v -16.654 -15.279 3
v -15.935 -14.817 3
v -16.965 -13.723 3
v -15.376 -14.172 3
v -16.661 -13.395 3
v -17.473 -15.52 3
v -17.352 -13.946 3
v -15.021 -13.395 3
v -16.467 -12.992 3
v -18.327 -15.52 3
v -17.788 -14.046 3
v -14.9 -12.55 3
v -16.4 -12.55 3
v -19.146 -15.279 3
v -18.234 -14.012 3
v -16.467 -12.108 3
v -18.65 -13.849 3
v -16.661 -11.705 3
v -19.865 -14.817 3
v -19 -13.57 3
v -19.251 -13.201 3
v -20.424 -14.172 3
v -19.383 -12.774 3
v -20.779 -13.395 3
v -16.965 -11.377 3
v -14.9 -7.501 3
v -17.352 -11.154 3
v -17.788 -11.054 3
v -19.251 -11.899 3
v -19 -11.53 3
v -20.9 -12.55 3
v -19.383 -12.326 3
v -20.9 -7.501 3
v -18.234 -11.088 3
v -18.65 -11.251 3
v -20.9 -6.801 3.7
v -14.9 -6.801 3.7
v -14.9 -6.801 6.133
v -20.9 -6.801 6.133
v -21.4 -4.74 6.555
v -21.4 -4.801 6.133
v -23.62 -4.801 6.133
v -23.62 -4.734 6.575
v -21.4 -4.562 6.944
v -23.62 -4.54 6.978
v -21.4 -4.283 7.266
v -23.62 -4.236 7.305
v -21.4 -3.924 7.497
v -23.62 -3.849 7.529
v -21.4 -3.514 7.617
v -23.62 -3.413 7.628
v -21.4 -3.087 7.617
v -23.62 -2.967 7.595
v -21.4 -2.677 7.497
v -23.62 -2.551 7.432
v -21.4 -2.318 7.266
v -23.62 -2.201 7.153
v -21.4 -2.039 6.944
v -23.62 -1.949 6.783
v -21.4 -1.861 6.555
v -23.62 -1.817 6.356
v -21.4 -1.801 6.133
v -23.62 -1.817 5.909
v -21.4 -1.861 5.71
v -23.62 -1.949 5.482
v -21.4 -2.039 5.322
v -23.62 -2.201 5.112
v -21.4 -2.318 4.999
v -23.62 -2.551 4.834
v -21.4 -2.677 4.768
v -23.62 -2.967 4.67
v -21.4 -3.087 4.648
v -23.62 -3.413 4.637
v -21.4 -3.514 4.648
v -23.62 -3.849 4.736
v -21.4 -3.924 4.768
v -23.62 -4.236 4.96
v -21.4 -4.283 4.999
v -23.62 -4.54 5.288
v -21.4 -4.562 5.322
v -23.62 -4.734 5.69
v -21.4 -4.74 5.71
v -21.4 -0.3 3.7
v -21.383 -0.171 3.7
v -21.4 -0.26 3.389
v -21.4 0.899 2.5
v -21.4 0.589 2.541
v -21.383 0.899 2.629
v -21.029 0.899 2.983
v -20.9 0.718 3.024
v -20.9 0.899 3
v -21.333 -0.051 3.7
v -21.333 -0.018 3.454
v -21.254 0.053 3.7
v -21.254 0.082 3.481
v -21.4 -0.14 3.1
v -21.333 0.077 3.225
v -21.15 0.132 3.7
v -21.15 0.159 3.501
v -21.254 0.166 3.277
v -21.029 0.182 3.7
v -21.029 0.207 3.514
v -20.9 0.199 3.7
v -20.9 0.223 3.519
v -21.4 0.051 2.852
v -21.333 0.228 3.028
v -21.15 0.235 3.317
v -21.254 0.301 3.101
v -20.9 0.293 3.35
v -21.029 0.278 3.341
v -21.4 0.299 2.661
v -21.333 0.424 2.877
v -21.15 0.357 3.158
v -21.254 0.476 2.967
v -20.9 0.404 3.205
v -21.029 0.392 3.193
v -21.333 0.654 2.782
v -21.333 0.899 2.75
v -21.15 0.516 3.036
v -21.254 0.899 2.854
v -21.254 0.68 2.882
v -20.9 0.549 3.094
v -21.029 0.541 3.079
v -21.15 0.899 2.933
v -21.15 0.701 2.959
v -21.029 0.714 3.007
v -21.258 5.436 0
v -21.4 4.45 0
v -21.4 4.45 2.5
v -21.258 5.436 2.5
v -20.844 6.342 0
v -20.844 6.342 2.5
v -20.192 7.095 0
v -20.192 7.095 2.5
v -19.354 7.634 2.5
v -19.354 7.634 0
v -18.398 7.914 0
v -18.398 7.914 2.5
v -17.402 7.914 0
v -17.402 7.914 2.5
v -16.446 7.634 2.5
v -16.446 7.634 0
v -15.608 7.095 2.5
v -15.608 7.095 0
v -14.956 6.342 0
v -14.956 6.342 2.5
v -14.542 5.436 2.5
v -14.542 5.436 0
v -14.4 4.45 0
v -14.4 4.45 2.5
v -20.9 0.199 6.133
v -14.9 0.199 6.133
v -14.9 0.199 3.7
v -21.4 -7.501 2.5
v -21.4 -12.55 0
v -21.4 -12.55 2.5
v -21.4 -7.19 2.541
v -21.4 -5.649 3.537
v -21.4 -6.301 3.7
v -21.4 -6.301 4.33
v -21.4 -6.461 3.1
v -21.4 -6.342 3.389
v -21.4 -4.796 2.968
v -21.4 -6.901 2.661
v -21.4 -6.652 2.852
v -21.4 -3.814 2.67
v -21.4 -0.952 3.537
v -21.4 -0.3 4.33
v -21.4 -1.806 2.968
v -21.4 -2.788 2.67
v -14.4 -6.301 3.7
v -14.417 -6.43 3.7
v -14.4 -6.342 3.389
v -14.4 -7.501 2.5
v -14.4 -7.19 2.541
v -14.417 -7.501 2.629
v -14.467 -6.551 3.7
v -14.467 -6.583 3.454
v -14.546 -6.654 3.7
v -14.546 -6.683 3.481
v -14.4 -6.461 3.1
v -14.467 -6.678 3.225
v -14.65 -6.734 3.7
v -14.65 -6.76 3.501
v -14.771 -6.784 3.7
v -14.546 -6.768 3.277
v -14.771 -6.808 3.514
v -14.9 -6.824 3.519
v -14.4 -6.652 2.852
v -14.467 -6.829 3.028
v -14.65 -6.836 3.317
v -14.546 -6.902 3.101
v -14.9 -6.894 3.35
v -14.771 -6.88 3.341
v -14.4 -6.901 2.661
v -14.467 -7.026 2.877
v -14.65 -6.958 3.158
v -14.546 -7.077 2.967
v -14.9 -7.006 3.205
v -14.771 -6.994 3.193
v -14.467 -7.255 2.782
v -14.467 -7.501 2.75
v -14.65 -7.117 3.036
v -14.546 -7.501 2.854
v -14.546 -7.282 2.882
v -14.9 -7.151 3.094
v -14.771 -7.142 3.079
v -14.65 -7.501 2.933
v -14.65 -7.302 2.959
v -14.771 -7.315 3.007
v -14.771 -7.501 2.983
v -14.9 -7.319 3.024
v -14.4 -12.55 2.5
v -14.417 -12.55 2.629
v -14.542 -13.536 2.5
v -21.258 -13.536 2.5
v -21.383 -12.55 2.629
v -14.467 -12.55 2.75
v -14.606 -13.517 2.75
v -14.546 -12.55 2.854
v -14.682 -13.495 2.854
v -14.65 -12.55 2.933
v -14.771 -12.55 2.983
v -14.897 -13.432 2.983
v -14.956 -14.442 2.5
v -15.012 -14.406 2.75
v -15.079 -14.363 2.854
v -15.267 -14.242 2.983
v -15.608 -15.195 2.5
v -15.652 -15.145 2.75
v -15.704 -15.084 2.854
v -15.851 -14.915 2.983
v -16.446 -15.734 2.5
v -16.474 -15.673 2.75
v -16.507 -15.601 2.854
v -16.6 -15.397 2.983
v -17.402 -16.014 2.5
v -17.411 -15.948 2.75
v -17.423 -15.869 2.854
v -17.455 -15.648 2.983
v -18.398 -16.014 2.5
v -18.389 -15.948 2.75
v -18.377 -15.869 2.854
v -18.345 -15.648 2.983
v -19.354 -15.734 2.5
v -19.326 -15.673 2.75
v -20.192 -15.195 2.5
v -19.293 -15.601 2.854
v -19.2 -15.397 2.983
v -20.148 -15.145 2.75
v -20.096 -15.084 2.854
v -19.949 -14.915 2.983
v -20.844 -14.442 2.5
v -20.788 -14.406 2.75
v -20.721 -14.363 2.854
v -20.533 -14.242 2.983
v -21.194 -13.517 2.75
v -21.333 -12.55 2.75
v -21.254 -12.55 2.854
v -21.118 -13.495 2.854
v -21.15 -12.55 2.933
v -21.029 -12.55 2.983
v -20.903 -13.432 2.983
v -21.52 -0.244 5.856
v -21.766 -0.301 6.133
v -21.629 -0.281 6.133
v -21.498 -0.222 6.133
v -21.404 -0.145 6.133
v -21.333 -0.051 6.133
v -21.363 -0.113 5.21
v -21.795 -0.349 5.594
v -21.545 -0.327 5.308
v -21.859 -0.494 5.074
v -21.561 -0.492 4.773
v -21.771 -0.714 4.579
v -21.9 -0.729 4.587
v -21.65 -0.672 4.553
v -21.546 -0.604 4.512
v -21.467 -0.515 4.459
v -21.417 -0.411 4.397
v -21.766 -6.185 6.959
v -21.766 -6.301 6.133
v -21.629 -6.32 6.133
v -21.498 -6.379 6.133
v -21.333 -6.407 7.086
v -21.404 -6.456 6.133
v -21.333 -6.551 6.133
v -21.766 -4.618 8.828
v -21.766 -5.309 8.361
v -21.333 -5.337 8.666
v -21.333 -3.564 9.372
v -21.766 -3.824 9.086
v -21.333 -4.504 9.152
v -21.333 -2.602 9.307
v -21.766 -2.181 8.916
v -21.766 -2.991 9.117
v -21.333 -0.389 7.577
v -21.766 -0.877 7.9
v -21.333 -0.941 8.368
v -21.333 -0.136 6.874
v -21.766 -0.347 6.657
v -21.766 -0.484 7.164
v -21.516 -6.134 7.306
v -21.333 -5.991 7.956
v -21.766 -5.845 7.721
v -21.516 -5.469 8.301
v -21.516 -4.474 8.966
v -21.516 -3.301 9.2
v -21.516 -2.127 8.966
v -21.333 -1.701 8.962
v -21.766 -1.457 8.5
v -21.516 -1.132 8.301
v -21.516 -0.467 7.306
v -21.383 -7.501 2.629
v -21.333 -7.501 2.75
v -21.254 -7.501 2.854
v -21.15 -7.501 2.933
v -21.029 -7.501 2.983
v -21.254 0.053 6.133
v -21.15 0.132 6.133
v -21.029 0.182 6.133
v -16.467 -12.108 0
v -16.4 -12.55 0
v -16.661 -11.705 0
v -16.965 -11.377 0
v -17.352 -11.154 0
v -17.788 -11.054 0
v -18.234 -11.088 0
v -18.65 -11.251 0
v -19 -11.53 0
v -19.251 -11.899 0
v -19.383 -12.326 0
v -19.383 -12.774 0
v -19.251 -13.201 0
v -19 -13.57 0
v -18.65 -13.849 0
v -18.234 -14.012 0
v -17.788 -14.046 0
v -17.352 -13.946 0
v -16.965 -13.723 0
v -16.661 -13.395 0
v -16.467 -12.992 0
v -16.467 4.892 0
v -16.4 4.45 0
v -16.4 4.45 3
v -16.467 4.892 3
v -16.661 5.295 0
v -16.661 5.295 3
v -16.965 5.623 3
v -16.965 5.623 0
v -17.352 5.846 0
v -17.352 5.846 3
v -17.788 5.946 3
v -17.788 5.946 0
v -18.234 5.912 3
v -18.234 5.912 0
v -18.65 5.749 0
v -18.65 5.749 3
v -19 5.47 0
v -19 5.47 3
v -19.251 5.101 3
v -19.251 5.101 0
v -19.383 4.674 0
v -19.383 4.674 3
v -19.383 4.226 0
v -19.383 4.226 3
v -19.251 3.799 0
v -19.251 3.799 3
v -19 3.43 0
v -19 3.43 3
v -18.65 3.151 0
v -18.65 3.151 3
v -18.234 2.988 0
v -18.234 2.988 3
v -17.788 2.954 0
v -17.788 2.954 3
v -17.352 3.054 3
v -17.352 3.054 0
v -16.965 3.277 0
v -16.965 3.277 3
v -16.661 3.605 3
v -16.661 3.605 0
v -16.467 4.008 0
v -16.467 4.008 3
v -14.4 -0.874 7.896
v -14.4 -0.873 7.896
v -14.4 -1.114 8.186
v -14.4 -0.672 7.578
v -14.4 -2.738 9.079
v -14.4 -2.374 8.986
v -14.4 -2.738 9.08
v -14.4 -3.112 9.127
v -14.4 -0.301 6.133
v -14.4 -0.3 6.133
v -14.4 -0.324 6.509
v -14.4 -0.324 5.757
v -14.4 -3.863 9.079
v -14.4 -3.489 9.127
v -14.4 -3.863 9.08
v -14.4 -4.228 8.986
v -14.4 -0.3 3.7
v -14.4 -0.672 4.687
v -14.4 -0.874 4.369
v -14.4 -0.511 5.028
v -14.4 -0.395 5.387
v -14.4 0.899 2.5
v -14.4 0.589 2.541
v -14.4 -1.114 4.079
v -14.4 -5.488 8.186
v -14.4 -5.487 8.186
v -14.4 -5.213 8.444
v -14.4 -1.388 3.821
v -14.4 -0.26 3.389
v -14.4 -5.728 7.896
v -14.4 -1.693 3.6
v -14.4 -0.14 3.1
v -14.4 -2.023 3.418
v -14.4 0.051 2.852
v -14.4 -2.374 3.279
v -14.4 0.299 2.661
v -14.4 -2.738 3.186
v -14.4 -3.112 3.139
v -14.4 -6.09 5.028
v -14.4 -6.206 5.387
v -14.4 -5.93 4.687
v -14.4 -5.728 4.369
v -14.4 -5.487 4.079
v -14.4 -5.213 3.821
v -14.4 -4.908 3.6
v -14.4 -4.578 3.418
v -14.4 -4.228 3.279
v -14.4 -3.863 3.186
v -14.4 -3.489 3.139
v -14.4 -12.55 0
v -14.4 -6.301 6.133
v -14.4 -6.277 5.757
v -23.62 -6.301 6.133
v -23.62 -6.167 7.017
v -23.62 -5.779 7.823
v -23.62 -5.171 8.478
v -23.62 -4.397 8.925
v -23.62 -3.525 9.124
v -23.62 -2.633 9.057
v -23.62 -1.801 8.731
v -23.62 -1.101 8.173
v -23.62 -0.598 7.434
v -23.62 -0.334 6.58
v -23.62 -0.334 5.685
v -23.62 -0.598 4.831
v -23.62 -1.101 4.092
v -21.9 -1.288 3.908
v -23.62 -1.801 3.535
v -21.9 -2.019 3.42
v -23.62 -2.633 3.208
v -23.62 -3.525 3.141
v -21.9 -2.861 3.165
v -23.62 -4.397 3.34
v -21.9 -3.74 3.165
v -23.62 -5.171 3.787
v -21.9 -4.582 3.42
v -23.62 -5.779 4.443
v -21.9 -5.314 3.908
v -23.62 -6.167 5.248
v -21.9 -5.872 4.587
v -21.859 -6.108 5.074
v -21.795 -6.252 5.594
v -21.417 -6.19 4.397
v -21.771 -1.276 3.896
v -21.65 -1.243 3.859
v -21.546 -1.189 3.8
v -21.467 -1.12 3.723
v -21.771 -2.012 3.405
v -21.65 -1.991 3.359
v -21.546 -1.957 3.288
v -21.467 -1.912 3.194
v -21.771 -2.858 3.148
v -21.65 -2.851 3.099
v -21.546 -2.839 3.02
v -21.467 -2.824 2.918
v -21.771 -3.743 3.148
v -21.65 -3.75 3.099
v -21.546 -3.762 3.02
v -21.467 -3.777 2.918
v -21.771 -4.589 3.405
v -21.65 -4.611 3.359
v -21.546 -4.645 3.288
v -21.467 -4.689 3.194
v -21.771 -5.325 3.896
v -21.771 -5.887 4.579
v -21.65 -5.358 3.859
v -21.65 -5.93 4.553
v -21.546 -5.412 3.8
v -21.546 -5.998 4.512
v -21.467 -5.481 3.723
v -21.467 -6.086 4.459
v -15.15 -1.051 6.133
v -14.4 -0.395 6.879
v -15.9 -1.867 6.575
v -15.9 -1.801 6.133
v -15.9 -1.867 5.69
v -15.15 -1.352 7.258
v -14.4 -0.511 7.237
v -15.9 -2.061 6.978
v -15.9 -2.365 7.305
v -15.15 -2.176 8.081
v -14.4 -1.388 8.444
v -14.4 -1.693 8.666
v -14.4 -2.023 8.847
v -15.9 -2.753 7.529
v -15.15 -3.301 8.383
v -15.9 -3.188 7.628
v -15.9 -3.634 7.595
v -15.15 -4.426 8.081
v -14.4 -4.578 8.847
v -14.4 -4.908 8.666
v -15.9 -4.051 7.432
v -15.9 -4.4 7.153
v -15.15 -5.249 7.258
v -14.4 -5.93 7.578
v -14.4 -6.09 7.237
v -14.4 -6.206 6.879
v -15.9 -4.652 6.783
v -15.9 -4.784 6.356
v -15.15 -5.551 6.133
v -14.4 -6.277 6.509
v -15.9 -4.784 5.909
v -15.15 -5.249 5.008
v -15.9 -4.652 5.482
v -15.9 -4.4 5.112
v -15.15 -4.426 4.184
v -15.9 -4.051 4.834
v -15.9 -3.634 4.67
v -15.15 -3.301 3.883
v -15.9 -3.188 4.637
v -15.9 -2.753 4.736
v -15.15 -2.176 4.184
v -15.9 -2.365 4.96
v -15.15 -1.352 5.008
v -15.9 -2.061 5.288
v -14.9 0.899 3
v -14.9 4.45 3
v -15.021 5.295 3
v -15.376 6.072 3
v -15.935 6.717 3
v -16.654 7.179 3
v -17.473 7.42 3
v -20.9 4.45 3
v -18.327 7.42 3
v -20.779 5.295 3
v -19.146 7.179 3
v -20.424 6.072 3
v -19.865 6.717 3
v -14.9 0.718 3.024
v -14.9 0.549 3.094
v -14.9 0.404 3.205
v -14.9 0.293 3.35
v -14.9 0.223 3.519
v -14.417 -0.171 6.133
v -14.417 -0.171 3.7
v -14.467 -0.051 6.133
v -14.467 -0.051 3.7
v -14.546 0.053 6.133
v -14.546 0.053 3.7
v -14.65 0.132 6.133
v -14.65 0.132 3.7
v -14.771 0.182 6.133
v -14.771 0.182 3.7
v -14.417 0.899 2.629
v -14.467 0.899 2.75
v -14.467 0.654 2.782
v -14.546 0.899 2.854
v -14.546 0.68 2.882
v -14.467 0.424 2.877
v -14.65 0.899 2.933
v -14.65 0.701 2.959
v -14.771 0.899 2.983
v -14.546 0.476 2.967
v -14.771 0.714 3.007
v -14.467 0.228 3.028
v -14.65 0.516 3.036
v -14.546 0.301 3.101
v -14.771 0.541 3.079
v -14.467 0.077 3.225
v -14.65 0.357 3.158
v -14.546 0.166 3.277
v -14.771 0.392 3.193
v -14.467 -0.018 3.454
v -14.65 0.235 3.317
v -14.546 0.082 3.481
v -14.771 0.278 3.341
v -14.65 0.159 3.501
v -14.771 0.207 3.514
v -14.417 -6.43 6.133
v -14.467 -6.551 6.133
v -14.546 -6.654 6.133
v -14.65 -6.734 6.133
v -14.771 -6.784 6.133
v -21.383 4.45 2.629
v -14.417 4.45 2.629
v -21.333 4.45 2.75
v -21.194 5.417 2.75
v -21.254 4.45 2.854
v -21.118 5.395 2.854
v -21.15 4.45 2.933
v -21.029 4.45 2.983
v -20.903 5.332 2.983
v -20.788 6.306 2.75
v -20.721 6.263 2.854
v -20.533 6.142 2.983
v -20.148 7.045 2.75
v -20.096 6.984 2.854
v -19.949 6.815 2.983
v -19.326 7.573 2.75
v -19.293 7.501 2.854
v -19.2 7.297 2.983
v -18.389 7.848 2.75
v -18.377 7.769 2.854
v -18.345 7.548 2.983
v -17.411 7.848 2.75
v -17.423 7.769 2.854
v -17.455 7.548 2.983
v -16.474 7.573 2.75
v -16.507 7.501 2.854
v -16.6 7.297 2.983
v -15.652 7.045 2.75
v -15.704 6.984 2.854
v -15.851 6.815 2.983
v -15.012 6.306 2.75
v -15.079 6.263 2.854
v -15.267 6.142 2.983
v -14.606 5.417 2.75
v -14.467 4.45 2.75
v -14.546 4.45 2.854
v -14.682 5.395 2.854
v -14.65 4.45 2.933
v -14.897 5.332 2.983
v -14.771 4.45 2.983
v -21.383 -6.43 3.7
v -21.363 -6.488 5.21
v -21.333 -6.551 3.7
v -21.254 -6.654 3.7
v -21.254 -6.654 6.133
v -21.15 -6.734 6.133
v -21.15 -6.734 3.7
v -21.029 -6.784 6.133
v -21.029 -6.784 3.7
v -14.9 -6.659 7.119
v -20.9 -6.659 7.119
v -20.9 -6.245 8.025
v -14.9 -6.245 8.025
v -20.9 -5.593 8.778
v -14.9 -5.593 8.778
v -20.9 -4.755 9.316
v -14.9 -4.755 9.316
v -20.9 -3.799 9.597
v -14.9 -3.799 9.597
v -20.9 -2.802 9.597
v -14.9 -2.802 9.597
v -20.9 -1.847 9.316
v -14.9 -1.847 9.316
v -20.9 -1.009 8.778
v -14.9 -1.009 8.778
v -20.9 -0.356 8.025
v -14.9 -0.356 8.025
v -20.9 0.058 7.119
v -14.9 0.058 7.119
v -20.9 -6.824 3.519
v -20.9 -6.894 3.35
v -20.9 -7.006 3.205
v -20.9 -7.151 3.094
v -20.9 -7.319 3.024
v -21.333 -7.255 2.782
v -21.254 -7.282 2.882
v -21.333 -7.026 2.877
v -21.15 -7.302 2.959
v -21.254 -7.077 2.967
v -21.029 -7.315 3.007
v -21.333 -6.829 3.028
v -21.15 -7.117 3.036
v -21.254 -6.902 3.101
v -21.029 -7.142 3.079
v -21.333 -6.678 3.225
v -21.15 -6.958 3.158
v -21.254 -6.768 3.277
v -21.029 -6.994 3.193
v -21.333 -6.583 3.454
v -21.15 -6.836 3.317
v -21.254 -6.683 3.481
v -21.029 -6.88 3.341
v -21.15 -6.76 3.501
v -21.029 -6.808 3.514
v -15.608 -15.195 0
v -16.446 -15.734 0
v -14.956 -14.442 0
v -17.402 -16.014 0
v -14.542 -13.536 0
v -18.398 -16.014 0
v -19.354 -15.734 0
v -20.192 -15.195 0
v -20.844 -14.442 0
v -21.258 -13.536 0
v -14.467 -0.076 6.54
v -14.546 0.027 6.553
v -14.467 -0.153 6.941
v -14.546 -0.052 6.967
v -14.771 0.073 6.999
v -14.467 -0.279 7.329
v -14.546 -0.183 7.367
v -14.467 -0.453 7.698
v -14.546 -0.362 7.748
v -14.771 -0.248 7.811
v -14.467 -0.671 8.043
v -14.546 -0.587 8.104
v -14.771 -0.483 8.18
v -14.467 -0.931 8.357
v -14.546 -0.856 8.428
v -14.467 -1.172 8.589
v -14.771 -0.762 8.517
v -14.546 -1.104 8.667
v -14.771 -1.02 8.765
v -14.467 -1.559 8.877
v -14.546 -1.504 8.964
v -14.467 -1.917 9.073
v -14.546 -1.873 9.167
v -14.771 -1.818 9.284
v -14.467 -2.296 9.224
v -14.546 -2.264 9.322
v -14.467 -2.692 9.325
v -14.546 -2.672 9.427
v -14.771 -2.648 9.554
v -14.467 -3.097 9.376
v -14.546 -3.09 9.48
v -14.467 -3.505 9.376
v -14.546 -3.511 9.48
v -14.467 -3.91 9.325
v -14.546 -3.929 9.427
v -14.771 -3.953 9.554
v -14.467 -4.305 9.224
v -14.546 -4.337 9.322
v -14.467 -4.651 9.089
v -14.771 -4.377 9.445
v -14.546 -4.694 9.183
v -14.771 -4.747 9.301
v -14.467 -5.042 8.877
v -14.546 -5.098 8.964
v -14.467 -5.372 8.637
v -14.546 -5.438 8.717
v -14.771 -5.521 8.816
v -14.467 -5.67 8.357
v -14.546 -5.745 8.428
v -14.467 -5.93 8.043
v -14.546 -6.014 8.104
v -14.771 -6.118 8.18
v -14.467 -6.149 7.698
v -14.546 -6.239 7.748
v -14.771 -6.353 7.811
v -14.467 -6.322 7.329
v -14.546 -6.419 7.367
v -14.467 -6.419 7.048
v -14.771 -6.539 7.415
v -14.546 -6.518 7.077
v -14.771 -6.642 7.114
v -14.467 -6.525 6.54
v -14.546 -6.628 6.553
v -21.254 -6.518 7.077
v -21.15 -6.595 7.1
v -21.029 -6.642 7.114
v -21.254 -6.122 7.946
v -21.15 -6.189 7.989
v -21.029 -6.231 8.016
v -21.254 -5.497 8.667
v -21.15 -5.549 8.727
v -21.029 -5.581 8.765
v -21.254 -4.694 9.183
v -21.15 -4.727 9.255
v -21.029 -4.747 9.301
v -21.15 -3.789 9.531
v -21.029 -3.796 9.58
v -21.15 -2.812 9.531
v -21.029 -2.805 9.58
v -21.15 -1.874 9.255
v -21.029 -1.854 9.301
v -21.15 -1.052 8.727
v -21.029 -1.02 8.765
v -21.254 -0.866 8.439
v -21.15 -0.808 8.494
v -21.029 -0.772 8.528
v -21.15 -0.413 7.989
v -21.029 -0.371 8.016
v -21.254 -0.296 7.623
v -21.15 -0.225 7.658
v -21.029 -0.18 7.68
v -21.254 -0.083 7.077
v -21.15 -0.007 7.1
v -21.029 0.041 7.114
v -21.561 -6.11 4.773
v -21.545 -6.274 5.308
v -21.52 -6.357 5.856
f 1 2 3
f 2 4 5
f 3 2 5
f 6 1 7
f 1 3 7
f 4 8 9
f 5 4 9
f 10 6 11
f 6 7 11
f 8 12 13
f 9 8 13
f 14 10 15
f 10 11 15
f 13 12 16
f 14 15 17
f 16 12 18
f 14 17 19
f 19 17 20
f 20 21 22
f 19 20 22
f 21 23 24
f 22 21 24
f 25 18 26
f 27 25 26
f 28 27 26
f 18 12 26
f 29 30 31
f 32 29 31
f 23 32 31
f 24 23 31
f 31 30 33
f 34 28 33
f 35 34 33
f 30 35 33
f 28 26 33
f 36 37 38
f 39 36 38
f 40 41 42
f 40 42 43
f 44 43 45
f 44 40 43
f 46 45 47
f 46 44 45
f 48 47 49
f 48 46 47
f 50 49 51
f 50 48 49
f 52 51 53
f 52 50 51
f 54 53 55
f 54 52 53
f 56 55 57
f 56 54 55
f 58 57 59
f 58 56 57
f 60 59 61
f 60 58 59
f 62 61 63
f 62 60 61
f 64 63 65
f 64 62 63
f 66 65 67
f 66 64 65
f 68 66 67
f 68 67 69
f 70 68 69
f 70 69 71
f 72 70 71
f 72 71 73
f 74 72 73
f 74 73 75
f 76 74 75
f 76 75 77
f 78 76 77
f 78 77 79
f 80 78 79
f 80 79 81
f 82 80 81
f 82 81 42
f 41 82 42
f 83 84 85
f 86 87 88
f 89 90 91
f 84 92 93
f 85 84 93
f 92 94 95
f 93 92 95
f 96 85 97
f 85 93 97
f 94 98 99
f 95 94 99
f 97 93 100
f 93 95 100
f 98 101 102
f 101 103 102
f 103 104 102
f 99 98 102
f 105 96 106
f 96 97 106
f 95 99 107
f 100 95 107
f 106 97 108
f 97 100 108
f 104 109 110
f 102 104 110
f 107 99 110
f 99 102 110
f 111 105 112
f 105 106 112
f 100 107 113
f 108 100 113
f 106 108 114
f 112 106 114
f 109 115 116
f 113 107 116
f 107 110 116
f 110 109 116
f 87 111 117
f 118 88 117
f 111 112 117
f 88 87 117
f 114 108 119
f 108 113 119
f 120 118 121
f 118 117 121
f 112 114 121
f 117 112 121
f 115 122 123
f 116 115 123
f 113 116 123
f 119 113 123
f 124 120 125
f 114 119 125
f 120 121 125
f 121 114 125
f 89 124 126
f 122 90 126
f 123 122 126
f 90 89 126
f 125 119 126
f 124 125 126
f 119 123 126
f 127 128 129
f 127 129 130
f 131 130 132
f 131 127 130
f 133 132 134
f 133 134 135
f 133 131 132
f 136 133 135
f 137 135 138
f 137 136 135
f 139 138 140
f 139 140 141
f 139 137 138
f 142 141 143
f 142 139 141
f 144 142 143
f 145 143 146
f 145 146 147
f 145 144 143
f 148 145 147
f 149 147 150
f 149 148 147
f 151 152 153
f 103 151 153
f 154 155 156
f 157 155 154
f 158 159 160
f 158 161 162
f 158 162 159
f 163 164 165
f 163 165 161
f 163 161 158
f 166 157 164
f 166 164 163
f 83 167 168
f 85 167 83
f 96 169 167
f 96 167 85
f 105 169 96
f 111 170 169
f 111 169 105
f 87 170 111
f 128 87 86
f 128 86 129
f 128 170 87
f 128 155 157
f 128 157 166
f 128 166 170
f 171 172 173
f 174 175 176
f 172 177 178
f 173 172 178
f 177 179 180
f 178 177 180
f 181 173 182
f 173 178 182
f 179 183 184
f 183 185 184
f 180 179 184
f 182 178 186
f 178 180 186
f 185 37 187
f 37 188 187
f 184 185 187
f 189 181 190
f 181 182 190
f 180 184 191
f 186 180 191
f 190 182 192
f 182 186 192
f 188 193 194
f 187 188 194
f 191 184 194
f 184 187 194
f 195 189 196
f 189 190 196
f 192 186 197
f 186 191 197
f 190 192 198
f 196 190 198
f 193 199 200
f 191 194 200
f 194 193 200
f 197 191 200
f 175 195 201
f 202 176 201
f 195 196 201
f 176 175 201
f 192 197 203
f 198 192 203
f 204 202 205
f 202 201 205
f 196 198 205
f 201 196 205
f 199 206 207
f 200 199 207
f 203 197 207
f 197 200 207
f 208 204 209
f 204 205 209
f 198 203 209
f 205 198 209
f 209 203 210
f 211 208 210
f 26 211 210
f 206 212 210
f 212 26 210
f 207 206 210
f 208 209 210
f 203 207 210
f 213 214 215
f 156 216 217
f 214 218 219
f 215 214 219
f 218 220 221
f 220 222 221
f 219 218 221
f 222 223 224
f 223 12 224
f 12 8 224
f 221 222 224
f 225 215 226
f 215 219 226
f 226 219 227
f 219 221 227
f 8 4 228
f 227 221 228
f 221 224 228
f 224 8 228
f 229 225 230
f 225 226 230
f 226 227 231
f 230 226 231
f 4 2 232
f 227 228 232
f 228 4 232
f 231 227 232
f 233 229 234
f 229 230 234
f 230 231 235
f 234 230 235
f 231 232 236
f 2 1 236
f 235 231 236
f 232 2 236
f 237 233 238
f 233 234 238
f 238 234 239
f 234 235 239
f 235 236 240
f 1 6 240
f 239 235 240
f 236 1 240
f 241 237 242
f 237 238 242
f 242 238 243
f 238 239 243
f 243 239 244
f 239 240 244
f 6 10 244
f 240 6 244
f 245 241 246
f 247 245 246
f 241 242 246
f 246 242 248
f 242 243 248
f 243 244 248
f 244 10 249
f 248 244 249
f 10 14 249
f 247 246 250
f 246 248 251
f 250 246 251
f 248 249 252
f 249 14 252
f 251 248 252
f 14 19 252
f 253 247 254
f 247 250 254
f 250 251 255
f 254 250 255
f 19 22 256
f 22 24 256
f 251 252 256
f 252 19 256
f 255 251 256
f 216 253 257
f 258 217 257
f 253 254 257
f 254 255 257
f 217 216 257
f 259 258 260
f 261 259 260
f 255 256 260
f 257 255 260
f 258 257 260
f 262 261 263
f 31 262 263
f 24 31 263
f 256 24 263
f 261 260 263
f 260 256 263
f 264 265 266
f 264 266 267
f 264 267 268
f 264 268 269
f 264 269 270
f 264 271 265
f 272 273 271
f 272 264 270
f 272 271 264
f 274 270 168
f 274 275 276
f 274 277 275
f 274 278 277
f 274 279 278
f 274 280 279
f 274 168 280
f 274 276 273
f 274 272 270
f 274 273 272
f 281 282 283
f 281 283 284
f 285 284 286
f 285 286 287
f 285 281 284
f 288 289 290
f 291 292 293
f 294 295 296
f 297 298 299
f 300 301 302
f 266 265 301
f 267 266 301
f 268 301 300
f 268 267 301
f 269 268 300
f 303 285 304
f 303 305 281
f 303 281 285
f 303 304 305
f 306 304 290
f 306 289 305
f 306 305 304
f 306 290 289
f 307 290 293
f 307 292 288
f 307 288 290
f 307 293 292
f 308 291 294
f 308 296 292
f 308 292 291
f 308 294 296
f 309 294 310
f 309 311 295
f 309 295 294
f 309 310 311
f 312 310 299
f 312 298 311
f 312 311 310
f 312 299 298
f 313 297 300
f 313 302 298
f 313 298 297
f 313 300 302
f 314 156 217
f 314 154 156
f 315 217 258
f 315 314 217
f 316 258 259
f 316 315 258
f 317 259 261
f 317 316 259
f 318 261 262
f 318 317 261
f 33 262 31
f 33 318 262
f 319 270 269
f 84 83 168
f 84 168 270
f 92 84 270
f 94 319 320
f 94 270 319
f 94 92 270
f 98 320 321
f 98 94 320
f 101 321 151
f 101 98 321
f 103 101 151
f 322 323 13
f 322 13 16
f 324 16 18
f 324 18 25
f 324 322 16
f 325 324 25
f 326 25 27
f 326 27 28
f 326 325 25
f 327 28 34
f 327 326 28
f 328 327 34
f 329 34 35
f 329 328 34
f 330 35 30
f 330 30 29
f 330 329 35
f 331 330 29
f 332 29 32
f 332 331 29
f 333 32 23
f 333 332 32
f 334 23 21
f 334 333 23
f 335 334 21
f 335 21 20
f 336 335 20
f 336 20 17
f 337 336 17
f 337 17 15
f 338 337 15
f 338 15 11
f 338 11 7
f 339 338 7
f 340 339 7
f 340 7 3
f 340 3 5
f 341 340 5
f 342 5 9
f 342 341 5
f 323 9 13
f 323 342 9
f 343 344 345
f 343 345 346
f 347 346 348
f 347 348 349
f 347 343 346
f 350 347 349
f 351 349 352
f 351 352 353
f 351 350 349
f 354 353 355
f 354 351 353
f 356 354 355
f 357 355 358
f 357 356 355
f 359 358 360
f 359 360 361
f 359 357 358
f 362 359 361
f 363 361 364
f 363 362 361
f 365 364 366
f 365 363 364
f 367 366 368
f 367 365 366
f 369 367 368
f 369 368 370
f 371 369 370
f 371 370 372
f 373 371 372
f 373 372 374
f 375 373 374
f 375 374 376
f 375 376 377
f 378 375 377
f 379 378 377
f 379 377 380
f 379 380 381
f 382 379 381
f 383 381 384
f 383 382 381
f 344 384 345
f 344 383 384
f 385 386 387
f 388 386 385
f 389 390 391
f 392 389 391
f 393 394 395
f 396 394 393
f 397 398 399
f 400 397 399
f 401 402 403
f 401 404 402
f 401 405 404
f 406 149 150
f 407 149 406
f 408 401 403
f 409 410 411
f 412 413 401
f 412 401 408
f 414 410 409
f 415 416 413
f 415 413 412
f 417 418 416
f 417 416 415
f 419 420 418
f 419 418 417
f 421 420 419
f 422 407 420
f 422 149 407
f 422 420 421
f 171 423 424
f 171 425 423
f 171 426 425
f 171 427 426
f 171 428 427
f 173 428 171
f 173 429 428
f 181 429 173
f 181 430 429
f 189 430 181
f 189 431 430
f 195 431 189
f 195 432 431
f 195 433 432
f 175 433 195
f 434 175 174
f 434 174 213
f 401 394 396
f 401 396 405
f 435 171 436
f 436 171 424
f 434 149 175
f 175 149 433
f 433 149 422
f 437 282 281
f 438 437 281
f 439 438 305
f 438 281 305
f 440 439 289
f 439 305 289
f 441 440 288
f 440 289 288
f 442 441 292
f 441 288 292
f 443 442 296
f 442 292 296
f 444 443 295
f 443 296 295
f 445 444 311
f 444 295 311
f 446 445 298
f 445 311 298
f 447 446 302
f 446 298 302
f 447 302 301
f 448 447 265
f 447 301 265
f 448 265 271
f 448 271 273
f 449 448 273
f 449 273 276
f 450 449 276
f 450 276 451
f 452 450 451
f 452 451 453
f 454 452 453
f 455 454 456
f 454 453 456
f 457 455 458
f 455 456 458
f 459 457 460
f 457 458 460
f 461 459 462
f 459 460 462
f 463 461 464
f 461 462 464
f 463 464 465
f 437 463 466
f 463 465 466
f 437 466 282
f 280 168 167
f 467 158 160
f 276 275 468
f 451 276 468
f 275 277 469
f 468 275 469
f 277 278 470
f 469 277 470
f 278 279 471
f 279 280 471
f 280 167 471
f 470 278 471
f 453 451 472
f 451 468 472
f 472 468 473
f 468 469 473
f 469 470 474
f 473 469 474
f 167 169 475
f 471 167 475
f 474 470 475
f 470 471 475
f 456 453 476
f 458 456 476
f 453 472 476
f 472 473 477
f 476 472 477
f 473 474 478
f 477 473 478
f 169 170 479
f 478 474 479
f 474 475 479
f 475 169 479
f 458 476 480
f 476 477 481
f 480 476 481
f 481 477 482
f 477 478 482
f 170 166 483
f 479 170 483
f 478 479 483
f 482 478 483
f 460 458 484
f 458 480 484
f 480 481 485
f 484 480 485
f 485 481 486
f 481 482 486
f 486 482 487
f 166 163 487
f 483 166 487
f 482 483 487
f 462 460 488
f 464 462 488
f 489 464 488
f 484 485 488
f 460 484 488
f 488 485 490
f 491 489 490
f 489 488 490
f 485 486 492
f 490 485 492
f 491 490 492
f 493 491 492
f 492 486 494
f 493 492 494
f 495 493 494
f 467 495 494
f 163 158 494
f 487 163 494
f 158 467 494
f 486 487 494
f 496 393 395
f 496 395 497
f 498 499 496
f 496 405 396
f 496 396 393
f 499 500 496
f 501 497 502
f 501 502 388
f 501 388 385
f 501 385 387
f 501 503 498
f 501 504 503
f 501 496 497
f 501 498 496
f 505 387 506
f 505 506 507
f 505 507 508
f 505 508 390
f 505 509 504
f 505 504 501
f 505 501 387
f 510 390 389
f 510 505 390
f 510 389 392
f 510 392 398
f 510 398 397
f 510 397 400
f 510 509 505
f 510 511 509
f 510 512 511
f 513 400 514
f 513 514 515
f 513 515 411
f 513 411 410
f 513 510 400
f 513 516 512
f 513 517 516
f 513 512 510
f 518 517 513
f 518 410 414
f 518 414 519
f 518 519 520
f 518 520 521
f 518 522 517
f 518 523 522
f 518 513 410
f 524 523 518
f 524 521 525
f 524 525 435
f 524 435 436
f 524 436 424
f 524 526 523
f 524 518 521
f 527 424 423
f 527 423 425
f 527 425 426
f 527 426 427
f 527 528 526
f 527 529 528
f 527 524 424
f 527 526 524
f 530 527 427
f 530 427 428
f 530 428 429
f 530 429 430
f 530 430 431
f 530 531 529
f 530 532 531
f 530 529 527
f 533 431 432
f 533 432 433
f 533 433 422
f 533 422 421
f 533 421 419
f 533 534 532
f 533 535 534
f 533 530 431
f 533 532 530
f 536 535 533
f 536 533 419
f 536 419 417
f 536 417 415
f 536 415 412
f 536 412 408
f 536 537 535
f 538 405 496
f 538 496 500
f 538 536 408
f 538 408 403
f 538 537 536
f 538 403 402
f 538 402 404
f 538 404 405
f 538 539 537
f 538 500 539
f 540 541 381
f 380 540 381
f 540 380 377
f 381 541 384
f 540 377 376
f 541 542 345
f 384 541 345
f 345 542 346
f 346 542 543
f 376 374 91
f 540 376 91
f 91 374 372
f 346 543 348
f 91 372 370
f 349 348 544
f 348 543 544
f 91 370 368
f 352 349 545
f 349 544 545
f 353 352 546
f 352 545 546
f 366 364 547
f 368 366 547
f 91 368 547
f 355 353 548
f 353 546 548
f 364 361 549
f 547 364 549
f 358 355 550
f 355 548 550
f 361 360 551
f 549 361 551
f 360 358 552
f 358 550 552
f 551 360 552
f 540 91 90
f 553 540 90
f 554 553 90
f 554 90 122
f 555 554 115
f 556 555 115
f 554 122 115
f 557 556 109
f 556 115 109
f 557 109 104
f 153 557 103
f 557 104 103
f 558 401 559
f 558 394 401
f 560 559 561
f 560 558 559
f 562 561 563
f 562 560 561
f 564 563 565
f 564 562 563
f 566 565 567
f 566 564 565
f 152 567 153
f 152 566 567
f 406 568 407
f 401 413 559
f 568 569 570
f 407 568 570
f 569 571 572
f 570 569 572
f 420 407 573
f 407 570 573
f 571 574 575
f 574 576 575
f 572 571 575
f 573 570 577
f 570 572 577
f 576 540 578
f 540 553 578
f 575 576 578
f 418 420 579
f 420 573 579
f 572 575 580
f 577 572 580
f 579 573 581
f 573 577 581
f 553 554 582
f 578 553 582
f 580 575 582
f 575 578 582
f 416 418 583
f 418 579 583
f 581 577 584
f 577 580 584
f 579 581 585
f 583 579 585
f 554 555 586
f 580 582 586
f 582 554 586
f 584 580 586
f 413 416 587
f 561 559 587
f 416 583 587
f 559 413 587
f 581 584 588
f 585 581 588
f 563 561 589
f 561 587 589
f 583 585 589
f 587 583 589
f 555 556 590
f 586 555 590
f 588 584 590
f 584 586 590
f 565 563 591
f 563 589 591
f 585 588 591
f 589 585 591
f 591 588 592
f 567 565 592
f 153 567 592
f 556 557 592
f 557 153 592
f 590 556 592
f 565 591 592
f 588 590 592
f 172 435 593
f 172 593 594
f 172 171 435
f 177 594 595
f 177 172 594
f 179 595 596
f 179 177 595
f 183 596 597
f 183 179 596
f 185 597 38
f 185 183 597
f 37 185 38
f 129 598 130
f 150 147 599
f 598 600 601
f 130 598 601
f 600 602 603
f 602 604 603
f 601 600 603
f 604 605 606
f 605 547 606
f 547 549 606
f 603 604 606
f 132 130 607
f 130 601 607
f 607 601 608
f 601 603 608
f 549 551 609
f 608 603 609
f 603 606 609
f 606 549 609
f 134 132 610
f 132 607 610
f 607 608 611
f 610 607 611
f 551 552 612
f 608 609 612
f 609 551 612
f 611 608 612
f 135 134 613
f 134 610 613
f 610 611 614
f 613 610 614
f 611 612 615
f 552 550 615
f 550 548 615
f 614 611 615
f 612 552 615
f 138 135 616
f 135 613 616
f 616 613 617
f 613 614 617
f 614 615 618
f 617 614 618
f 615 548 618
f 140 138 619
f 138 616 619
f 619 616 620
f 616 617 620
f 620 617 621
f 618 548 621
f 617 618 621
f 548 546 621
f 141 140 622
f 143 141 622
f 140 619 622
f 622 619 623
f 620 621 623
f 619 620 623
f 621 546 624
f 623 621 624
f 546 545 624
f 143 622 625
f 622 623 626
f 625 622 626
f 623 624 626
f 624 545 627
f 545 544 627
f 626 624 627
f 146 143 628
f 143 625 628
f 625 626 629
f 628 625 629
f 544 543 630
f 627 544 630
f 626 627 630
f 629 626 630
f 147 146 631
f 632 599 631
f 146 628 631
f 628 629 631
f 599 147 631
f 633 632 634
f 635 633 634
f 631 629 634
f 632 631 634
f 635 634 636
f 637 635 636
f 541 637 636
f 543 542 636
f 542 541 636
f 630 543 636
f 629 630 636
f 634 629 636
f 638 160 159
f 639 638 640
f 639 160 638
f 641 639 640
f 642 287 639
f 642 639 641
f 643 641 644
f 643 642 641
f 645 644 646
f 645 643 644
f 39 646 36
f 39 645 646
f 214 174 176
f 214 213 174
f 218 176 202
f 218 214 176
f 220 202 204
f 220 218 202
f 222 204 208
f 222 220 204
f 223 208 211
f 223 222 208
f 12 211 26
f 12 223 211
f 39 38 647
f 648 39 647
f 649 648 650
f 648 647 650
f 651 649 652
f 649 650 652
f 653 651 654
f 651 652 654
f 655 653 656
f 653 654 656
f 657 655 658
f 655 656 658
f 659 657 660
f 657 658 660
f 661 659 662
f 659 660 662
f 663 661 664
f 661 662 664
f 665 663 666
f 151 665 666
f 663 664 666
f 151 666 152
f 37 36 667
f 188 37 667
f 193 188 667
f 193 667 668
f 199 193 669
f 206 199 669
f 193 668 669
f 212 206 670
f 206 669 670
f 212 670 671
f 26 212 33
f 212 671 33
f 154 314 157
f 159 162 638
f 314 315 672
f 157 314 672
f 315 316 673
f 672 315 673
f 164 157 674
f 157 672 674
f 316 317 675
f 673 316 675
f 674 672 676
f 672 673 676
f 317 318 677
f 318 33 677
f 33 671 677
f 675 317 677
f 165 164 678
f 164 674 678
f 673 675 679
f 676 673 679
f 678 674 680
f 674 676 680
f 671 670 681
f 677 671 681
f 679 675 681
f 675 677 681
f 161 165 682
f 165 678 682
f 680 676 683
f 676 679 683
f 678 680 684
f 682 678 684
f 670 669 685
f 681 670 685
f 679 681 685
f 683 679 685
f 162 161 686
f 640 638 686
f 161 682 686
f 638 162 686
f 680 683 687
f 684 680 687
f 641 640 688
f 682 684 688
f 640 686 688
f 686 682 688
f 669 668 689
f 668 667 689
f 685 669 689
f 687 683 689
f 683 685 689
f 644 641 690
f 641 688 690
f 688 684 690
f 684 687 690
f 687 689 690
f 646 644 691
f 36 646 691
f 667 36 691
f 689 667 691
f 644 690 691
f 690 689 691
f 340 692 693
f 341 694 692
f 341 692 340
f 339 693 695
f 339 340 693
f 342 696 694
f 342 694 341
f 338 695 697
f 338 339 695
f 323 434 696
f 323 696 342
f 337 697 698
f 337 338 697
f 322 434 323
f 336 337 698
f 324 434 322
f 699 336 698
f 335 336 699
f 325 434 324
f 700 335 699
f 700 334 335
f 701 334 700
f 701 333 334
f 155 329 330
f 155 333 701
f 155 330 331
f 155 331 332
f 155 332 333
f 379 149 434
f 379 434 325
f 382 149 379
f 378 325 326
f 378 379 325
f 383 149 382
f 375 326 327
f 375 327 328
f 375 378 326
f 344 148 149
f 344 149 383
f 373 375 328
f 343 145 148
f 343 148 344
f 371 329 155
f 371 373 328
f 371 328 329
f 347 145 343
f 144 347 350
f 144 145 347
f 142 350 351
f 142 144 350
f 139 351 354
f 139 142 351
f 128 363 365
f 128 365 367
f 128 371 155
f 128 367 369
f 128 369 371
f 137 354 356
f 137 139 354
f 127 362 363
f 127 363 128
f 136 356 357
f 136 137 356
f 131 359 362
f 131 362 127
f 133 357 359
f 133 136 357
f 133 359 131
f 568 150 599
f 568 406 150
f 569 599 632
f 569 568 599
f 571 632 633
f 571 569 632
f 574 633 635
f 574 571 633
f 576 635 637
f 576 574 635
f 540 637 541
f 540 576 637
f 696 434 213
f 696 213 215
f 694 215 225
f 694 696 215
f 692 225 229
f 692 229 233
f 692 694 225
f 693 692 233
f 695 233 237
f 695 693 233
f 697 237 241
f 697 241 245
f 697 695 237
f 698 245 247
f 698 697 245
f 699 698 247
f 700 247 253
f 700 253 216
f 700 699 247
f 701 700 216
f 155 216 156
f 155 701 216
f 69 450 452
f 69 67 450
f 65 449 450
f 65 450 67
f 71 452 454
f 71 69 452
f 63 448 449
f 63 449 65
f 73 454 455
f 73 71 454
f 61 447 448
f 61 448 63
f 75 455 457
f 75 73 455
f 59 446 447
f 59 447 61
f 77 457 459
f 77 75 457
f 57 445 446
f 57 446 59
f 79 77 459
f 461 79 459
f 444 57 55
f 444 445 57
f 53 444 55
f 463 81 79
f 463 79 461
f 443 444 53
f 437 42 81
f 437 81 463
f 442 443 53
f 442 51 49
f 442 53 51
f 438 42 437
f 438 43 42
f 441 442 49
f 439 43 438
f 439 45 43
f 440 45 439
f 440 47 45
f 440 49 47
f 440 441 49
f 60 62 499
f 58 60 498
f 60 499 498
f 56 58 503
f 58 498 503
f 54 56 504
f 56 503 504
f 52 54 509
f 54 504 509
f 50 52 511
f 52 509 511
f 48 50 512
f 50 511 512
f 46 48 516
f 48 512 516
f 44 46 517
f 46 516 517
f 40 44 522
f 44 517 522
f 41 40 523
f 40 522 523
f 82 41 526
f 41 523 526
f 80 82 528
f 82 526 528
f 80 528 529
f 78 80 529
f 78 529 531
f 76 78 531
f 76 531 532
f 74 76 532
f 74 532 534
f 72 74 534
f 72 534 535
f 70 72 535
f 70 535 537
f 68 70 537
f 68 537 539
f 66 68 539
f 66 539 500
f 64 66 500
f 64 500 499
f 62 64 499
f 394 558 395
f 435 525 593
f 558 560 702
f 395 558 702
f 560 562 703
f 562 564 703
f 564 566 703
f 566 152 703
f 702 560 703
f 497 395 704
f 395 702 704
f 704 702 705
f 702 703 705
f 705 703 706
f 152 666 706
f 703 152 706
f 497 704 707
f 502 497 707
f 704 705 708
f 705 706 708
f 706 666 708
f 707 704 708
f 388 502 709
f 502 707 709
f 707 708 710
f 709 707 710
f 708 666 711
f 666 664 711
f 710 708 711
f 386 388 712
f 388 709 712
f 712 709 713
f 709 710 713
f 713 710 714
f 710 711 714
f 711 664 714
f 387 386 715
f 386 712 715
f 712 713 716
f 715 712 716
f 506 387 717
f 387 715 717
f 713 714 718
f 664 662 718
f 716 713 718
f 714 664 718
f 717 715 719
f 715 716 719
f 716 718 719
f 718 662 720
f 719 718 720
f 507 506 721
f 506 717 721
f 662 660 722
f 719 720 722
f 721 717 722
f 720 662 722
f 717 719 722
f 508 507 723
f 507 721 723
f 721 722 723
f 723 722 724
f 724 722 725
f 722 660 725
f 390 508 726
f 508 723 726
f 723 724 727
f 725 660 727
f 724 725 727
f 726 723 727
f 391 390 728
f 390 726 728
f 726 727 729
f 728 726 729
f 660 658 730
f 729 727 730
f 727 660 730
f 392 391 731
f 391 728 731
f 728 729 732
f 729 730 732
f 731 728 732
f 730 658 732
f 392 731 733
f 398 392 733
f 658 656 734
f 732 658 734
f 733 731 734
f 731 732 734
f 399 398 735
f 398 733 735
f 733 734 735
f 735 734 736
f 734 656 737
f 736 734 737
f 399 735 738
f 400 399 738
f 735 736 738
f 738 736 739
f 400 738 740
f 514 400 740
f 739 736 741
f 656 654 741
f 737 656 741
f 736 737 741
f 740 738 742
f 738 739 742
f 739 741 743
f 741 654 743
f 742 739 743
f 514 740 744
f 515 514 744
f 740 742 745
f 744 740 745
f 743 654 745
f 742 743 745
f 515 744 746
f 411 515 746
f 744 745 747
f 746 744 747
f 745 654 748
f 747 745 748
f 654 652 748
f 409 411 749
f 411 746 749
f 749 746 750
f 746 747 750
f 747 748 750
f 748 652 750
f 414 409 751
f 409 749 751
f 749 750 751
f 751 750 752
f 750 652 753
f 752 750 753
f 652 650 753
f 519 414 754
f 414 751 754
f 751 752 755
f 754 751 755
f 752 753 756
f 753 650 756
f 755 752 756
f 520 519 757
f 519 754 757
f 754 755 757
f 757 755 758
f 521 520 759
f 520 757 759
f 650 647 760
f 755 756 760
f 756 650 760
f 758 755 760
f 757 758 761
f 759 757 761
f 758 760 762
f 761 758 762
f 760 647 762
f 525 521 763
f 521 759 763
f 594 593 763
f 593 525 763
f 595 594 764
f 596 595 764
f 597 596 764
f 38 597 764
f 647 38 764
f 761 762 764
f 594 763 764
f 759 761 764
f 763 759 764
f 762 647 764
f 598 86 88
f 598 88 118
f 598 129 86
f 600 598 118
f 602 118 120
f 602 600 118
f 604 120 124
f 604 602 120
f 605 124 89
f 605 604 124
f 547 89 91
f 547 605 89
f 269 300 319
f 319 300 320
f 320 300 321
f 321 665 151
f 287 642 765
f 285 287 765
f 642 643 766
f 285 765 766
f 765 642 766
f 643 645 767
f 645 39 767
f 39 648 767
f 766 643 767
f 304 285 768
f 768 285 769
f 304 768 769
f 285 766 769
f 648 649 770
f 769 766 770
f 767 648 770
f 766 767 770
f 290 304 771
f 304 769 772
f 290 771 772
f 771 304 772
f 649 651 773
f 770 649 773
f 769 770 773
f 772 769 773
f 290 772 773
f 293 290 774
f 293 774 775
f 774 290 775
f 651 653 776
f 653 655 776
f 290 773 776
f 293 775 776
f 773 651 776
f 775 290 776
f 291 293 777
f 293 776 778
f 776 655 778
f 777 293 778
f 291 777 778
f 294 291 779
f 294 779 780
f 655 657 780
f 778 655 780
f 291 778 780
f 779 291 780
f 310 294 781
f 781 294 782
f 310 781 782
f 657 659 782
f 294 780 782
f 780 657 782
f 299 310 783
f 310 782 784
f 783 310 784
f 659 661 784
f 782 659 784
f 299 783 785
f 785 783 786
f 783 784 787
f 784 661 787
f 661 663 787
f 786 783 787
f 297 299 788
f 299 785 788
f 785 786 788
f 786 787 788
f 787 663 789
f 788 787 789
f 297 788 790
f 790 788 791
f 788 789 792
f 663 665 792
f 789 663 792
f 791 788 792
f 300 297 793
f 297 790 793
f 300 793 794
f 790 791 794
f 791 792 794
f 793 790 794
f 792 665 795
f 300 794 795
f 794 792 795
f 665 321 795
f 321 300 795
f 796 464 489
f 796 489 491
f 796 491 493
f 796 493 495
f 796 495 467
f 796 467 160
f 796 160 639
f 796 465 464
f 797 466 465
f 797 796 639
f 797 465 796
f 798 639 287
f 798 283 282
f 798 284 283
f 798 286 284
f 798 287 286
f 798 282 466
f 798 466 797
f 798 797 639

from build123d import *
from build123d.topology import SkipClean

# Parameters (mm, degrees)
SKETCH_1_R      = 1.5
EXTRUDE_1_DEPTH = 3
SKETCH_2_R      = 1.5
EXTRUDE_2_DEPTH = 7
CHAMFER_1_SIZE  = 1.5
FILLET_1_R      = 0.7
FILLET_2_R      = 0.5
SKETCH_3_R      = 3
SKETCH_3_R_2    = 1.5
EXTRUDE_3_DEPTH = 2.22
FILLET_3_R      = 0.5


with BuildPart() as part:
    # 草图1 → 凸台-拉伸1 (new body)
    with BuildSketch(Plane.XY):
        with BuildLine():
            Line((-14.399999999, 4.45), (-14.399999999, -12.55))
            ThreePointArc((-14.399999999, -12.55), (-17.899999999, -16.05), (-21.399999999, -12.55))
            Line((-21.399999999, -12.55), (-21.399999999, 4.45))
            ThreePointArc((-21.399999999, 4.45), (-17.899999999, 7.95), (-14.399999999, 4.45))
        make_face()
        with Locations((-17.899999999, 4.45)):
            Circle(SKETCH_1_R, mode=Mode.SUBTRACT)
        with Locations((-17.899999999, -12.55)):
            Circle(SKETCH_1_R, mode=Mode.SUBTRACT)
    extrude(amount=EXTRUDE_1_DEPTH)

    # 草图2 → 凸台-拉伸2 (add)
    with BuildSketch(Plane(origin=(-14.399999999, 0, 0), x_dir=(0, 0, -1), z_dir=(1, 0, 0))):
        with BuildLine():
            Line((-6.132588308, 0.199416458), (-3, 0.199416458))
            Line((-3, 0.199416458), (-3, -6.800583542))
            Line((-3, -6.800583542), (-6.132588308, -6.800583542))
            ThreePointArc((-6.132588308, -6.800583542), (-9.632588308, -3.300583542), (-6.132588308, 0.199416458))
        make_face()
        with Locations(Location((-6.132588308, -3.300583542, 0), (0, 0, 90))):
            Circle(SKETCH_2_R, mode=Mode.SUBTRACT)
    extrude(amount=-EXTRUDE_2_DEPTH)

    # 倒角1
    chamfer_1_edges = [part.edges().sort_by_distance(p)[0] for p in [
        (-14.399999999, -4.800583542, 6.132588308),
    ]]
    chamfer(chamfer_1_edges, length=CHAMFER_1_SIZE)

    # 圆角1
    fillet_1_edges = [part.edges().sort_by_distance(p)[0] for p in [
        (-17.899999999, -6.800583542, 3),
        (-17.899999999, 0.199416458, 3),
    ]]
    fillet(fillet_1_edges, radius=FILLET_1_R)

    # 圆角2
    fillet_2_edges = [part.edges().sort_by_distance(p)[0] for p in [
        (-17.899999999, -16.05, 3),
        (-14.399999999, -10.025291771, 3),
        (-14.399999999, -3.300583542, 9.632588308),
        (-14.399999999, -6.800583542, 4.916294154),
        (-21.399999999, -3.300583542, 9.632588308),
        (-21.399999999, 0.199416458, 4.916294154),
        (-14.399999999, 2.674708229, 3),
        (-14.399999999, 0.199416458, 4.916294154),
        (-21.399999999, -6.800583542, 4.916294154),
        (-21.399999999, -10.025291771, 3),
        (-14.399999999, 0.404441711, 3.205025253),
        (-21.399999999, 0.404441711, 3.205025253),
        (-14.399999999, -7.005608796, 3.205025253),
        (-21.399999999, -7.005608796, 3.205025253),
        (-17.899999999, 7.95, 3),
        (-21.399999999, 2.674708229, 3),
    ]]
    fillet(fillet_2_edges, radius=FILLET_2_R - 0.0001)  # a hair under: the kernel refuses the full size

    # 草图3 → 凸台-拉伸3 (add)
    with SkipClean():  # the faces are left unmerged after this step: merging them gives an invalid solid
        with BuildSketch(Plane.ZY.offset(21.399999999)):
            with Locations(Location((6.132588308, -3.300583542, 0), (0, 0, 270))):
                Circle(SKETCH_3_R)
            with Locations(Location((6.132588308, -3.300583542, 0), (0, 0, 270))):
                Circle(SKETCH_3_R_2, mode=Mode.SUBTRACT)
        extrude(amount=EXTRUDE_3_DEPTH)
    add(part.part.scale(1), mode=Mode.REPLACE)  # the faces are merged on a copy

    # 圆角3
    fillet_3_edges = [part.edges().sort_by_distance(p)[0] for p in [
        (-21.399999999, -0.300583542, 6.132588308),
        (-21.399999999, -0.300583542, 6.132588308),
    ]]
    fillet(fillet_3_edges, radius=FILLET_3_R)


solid = part.part
